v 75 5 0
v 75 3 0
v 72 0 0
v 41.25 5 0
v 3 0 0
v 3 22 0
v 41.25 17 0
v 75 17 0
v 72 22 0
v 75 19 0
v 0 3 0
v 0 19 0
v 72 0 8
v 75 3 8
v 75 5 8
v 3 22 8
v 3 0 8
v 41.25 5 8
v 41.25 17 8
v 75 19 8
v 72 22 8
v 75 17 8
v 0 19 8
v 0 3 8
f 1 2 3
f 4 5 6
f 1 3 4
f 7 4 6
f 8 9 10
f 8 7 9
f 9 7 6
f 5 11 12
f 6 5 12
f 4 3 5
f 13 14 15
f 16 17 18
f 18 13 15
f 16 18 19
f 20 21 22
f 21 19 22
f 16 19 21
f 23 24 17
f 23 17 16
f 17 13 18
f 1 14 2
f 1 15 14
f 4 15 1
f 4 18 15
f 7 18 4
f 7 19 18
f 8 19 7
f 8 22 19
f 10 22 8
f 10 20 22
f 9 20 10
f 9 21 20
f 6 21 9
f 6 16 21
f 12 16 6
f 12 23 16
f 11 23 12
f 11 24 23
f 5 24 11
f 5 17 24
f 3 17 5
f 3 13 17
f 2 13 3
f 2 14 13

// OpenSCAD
$fn = 32;
// ----------------------------------------------------------------------
// C washer: 75 x 22 mm plate with an open slot
// ----------------------------------------------------------------------

// --- parameters (mm) ---
profile_height = 8;       // extrusion height
profile_points = 12;      // points of the closed outline

profile = [[3, 0], [72, 0], [75, 3], [75, 5], [41.25, 5], [41.25, 17], [75, 17], [75, 19], [72, 22], [3, 22], [0, 19], [0, 3]];  // single closed polygon, 12 points, counter clockwise

// --- the one profile operation ---
linear_extrude(height = profile_height) polygon(points = profile);
